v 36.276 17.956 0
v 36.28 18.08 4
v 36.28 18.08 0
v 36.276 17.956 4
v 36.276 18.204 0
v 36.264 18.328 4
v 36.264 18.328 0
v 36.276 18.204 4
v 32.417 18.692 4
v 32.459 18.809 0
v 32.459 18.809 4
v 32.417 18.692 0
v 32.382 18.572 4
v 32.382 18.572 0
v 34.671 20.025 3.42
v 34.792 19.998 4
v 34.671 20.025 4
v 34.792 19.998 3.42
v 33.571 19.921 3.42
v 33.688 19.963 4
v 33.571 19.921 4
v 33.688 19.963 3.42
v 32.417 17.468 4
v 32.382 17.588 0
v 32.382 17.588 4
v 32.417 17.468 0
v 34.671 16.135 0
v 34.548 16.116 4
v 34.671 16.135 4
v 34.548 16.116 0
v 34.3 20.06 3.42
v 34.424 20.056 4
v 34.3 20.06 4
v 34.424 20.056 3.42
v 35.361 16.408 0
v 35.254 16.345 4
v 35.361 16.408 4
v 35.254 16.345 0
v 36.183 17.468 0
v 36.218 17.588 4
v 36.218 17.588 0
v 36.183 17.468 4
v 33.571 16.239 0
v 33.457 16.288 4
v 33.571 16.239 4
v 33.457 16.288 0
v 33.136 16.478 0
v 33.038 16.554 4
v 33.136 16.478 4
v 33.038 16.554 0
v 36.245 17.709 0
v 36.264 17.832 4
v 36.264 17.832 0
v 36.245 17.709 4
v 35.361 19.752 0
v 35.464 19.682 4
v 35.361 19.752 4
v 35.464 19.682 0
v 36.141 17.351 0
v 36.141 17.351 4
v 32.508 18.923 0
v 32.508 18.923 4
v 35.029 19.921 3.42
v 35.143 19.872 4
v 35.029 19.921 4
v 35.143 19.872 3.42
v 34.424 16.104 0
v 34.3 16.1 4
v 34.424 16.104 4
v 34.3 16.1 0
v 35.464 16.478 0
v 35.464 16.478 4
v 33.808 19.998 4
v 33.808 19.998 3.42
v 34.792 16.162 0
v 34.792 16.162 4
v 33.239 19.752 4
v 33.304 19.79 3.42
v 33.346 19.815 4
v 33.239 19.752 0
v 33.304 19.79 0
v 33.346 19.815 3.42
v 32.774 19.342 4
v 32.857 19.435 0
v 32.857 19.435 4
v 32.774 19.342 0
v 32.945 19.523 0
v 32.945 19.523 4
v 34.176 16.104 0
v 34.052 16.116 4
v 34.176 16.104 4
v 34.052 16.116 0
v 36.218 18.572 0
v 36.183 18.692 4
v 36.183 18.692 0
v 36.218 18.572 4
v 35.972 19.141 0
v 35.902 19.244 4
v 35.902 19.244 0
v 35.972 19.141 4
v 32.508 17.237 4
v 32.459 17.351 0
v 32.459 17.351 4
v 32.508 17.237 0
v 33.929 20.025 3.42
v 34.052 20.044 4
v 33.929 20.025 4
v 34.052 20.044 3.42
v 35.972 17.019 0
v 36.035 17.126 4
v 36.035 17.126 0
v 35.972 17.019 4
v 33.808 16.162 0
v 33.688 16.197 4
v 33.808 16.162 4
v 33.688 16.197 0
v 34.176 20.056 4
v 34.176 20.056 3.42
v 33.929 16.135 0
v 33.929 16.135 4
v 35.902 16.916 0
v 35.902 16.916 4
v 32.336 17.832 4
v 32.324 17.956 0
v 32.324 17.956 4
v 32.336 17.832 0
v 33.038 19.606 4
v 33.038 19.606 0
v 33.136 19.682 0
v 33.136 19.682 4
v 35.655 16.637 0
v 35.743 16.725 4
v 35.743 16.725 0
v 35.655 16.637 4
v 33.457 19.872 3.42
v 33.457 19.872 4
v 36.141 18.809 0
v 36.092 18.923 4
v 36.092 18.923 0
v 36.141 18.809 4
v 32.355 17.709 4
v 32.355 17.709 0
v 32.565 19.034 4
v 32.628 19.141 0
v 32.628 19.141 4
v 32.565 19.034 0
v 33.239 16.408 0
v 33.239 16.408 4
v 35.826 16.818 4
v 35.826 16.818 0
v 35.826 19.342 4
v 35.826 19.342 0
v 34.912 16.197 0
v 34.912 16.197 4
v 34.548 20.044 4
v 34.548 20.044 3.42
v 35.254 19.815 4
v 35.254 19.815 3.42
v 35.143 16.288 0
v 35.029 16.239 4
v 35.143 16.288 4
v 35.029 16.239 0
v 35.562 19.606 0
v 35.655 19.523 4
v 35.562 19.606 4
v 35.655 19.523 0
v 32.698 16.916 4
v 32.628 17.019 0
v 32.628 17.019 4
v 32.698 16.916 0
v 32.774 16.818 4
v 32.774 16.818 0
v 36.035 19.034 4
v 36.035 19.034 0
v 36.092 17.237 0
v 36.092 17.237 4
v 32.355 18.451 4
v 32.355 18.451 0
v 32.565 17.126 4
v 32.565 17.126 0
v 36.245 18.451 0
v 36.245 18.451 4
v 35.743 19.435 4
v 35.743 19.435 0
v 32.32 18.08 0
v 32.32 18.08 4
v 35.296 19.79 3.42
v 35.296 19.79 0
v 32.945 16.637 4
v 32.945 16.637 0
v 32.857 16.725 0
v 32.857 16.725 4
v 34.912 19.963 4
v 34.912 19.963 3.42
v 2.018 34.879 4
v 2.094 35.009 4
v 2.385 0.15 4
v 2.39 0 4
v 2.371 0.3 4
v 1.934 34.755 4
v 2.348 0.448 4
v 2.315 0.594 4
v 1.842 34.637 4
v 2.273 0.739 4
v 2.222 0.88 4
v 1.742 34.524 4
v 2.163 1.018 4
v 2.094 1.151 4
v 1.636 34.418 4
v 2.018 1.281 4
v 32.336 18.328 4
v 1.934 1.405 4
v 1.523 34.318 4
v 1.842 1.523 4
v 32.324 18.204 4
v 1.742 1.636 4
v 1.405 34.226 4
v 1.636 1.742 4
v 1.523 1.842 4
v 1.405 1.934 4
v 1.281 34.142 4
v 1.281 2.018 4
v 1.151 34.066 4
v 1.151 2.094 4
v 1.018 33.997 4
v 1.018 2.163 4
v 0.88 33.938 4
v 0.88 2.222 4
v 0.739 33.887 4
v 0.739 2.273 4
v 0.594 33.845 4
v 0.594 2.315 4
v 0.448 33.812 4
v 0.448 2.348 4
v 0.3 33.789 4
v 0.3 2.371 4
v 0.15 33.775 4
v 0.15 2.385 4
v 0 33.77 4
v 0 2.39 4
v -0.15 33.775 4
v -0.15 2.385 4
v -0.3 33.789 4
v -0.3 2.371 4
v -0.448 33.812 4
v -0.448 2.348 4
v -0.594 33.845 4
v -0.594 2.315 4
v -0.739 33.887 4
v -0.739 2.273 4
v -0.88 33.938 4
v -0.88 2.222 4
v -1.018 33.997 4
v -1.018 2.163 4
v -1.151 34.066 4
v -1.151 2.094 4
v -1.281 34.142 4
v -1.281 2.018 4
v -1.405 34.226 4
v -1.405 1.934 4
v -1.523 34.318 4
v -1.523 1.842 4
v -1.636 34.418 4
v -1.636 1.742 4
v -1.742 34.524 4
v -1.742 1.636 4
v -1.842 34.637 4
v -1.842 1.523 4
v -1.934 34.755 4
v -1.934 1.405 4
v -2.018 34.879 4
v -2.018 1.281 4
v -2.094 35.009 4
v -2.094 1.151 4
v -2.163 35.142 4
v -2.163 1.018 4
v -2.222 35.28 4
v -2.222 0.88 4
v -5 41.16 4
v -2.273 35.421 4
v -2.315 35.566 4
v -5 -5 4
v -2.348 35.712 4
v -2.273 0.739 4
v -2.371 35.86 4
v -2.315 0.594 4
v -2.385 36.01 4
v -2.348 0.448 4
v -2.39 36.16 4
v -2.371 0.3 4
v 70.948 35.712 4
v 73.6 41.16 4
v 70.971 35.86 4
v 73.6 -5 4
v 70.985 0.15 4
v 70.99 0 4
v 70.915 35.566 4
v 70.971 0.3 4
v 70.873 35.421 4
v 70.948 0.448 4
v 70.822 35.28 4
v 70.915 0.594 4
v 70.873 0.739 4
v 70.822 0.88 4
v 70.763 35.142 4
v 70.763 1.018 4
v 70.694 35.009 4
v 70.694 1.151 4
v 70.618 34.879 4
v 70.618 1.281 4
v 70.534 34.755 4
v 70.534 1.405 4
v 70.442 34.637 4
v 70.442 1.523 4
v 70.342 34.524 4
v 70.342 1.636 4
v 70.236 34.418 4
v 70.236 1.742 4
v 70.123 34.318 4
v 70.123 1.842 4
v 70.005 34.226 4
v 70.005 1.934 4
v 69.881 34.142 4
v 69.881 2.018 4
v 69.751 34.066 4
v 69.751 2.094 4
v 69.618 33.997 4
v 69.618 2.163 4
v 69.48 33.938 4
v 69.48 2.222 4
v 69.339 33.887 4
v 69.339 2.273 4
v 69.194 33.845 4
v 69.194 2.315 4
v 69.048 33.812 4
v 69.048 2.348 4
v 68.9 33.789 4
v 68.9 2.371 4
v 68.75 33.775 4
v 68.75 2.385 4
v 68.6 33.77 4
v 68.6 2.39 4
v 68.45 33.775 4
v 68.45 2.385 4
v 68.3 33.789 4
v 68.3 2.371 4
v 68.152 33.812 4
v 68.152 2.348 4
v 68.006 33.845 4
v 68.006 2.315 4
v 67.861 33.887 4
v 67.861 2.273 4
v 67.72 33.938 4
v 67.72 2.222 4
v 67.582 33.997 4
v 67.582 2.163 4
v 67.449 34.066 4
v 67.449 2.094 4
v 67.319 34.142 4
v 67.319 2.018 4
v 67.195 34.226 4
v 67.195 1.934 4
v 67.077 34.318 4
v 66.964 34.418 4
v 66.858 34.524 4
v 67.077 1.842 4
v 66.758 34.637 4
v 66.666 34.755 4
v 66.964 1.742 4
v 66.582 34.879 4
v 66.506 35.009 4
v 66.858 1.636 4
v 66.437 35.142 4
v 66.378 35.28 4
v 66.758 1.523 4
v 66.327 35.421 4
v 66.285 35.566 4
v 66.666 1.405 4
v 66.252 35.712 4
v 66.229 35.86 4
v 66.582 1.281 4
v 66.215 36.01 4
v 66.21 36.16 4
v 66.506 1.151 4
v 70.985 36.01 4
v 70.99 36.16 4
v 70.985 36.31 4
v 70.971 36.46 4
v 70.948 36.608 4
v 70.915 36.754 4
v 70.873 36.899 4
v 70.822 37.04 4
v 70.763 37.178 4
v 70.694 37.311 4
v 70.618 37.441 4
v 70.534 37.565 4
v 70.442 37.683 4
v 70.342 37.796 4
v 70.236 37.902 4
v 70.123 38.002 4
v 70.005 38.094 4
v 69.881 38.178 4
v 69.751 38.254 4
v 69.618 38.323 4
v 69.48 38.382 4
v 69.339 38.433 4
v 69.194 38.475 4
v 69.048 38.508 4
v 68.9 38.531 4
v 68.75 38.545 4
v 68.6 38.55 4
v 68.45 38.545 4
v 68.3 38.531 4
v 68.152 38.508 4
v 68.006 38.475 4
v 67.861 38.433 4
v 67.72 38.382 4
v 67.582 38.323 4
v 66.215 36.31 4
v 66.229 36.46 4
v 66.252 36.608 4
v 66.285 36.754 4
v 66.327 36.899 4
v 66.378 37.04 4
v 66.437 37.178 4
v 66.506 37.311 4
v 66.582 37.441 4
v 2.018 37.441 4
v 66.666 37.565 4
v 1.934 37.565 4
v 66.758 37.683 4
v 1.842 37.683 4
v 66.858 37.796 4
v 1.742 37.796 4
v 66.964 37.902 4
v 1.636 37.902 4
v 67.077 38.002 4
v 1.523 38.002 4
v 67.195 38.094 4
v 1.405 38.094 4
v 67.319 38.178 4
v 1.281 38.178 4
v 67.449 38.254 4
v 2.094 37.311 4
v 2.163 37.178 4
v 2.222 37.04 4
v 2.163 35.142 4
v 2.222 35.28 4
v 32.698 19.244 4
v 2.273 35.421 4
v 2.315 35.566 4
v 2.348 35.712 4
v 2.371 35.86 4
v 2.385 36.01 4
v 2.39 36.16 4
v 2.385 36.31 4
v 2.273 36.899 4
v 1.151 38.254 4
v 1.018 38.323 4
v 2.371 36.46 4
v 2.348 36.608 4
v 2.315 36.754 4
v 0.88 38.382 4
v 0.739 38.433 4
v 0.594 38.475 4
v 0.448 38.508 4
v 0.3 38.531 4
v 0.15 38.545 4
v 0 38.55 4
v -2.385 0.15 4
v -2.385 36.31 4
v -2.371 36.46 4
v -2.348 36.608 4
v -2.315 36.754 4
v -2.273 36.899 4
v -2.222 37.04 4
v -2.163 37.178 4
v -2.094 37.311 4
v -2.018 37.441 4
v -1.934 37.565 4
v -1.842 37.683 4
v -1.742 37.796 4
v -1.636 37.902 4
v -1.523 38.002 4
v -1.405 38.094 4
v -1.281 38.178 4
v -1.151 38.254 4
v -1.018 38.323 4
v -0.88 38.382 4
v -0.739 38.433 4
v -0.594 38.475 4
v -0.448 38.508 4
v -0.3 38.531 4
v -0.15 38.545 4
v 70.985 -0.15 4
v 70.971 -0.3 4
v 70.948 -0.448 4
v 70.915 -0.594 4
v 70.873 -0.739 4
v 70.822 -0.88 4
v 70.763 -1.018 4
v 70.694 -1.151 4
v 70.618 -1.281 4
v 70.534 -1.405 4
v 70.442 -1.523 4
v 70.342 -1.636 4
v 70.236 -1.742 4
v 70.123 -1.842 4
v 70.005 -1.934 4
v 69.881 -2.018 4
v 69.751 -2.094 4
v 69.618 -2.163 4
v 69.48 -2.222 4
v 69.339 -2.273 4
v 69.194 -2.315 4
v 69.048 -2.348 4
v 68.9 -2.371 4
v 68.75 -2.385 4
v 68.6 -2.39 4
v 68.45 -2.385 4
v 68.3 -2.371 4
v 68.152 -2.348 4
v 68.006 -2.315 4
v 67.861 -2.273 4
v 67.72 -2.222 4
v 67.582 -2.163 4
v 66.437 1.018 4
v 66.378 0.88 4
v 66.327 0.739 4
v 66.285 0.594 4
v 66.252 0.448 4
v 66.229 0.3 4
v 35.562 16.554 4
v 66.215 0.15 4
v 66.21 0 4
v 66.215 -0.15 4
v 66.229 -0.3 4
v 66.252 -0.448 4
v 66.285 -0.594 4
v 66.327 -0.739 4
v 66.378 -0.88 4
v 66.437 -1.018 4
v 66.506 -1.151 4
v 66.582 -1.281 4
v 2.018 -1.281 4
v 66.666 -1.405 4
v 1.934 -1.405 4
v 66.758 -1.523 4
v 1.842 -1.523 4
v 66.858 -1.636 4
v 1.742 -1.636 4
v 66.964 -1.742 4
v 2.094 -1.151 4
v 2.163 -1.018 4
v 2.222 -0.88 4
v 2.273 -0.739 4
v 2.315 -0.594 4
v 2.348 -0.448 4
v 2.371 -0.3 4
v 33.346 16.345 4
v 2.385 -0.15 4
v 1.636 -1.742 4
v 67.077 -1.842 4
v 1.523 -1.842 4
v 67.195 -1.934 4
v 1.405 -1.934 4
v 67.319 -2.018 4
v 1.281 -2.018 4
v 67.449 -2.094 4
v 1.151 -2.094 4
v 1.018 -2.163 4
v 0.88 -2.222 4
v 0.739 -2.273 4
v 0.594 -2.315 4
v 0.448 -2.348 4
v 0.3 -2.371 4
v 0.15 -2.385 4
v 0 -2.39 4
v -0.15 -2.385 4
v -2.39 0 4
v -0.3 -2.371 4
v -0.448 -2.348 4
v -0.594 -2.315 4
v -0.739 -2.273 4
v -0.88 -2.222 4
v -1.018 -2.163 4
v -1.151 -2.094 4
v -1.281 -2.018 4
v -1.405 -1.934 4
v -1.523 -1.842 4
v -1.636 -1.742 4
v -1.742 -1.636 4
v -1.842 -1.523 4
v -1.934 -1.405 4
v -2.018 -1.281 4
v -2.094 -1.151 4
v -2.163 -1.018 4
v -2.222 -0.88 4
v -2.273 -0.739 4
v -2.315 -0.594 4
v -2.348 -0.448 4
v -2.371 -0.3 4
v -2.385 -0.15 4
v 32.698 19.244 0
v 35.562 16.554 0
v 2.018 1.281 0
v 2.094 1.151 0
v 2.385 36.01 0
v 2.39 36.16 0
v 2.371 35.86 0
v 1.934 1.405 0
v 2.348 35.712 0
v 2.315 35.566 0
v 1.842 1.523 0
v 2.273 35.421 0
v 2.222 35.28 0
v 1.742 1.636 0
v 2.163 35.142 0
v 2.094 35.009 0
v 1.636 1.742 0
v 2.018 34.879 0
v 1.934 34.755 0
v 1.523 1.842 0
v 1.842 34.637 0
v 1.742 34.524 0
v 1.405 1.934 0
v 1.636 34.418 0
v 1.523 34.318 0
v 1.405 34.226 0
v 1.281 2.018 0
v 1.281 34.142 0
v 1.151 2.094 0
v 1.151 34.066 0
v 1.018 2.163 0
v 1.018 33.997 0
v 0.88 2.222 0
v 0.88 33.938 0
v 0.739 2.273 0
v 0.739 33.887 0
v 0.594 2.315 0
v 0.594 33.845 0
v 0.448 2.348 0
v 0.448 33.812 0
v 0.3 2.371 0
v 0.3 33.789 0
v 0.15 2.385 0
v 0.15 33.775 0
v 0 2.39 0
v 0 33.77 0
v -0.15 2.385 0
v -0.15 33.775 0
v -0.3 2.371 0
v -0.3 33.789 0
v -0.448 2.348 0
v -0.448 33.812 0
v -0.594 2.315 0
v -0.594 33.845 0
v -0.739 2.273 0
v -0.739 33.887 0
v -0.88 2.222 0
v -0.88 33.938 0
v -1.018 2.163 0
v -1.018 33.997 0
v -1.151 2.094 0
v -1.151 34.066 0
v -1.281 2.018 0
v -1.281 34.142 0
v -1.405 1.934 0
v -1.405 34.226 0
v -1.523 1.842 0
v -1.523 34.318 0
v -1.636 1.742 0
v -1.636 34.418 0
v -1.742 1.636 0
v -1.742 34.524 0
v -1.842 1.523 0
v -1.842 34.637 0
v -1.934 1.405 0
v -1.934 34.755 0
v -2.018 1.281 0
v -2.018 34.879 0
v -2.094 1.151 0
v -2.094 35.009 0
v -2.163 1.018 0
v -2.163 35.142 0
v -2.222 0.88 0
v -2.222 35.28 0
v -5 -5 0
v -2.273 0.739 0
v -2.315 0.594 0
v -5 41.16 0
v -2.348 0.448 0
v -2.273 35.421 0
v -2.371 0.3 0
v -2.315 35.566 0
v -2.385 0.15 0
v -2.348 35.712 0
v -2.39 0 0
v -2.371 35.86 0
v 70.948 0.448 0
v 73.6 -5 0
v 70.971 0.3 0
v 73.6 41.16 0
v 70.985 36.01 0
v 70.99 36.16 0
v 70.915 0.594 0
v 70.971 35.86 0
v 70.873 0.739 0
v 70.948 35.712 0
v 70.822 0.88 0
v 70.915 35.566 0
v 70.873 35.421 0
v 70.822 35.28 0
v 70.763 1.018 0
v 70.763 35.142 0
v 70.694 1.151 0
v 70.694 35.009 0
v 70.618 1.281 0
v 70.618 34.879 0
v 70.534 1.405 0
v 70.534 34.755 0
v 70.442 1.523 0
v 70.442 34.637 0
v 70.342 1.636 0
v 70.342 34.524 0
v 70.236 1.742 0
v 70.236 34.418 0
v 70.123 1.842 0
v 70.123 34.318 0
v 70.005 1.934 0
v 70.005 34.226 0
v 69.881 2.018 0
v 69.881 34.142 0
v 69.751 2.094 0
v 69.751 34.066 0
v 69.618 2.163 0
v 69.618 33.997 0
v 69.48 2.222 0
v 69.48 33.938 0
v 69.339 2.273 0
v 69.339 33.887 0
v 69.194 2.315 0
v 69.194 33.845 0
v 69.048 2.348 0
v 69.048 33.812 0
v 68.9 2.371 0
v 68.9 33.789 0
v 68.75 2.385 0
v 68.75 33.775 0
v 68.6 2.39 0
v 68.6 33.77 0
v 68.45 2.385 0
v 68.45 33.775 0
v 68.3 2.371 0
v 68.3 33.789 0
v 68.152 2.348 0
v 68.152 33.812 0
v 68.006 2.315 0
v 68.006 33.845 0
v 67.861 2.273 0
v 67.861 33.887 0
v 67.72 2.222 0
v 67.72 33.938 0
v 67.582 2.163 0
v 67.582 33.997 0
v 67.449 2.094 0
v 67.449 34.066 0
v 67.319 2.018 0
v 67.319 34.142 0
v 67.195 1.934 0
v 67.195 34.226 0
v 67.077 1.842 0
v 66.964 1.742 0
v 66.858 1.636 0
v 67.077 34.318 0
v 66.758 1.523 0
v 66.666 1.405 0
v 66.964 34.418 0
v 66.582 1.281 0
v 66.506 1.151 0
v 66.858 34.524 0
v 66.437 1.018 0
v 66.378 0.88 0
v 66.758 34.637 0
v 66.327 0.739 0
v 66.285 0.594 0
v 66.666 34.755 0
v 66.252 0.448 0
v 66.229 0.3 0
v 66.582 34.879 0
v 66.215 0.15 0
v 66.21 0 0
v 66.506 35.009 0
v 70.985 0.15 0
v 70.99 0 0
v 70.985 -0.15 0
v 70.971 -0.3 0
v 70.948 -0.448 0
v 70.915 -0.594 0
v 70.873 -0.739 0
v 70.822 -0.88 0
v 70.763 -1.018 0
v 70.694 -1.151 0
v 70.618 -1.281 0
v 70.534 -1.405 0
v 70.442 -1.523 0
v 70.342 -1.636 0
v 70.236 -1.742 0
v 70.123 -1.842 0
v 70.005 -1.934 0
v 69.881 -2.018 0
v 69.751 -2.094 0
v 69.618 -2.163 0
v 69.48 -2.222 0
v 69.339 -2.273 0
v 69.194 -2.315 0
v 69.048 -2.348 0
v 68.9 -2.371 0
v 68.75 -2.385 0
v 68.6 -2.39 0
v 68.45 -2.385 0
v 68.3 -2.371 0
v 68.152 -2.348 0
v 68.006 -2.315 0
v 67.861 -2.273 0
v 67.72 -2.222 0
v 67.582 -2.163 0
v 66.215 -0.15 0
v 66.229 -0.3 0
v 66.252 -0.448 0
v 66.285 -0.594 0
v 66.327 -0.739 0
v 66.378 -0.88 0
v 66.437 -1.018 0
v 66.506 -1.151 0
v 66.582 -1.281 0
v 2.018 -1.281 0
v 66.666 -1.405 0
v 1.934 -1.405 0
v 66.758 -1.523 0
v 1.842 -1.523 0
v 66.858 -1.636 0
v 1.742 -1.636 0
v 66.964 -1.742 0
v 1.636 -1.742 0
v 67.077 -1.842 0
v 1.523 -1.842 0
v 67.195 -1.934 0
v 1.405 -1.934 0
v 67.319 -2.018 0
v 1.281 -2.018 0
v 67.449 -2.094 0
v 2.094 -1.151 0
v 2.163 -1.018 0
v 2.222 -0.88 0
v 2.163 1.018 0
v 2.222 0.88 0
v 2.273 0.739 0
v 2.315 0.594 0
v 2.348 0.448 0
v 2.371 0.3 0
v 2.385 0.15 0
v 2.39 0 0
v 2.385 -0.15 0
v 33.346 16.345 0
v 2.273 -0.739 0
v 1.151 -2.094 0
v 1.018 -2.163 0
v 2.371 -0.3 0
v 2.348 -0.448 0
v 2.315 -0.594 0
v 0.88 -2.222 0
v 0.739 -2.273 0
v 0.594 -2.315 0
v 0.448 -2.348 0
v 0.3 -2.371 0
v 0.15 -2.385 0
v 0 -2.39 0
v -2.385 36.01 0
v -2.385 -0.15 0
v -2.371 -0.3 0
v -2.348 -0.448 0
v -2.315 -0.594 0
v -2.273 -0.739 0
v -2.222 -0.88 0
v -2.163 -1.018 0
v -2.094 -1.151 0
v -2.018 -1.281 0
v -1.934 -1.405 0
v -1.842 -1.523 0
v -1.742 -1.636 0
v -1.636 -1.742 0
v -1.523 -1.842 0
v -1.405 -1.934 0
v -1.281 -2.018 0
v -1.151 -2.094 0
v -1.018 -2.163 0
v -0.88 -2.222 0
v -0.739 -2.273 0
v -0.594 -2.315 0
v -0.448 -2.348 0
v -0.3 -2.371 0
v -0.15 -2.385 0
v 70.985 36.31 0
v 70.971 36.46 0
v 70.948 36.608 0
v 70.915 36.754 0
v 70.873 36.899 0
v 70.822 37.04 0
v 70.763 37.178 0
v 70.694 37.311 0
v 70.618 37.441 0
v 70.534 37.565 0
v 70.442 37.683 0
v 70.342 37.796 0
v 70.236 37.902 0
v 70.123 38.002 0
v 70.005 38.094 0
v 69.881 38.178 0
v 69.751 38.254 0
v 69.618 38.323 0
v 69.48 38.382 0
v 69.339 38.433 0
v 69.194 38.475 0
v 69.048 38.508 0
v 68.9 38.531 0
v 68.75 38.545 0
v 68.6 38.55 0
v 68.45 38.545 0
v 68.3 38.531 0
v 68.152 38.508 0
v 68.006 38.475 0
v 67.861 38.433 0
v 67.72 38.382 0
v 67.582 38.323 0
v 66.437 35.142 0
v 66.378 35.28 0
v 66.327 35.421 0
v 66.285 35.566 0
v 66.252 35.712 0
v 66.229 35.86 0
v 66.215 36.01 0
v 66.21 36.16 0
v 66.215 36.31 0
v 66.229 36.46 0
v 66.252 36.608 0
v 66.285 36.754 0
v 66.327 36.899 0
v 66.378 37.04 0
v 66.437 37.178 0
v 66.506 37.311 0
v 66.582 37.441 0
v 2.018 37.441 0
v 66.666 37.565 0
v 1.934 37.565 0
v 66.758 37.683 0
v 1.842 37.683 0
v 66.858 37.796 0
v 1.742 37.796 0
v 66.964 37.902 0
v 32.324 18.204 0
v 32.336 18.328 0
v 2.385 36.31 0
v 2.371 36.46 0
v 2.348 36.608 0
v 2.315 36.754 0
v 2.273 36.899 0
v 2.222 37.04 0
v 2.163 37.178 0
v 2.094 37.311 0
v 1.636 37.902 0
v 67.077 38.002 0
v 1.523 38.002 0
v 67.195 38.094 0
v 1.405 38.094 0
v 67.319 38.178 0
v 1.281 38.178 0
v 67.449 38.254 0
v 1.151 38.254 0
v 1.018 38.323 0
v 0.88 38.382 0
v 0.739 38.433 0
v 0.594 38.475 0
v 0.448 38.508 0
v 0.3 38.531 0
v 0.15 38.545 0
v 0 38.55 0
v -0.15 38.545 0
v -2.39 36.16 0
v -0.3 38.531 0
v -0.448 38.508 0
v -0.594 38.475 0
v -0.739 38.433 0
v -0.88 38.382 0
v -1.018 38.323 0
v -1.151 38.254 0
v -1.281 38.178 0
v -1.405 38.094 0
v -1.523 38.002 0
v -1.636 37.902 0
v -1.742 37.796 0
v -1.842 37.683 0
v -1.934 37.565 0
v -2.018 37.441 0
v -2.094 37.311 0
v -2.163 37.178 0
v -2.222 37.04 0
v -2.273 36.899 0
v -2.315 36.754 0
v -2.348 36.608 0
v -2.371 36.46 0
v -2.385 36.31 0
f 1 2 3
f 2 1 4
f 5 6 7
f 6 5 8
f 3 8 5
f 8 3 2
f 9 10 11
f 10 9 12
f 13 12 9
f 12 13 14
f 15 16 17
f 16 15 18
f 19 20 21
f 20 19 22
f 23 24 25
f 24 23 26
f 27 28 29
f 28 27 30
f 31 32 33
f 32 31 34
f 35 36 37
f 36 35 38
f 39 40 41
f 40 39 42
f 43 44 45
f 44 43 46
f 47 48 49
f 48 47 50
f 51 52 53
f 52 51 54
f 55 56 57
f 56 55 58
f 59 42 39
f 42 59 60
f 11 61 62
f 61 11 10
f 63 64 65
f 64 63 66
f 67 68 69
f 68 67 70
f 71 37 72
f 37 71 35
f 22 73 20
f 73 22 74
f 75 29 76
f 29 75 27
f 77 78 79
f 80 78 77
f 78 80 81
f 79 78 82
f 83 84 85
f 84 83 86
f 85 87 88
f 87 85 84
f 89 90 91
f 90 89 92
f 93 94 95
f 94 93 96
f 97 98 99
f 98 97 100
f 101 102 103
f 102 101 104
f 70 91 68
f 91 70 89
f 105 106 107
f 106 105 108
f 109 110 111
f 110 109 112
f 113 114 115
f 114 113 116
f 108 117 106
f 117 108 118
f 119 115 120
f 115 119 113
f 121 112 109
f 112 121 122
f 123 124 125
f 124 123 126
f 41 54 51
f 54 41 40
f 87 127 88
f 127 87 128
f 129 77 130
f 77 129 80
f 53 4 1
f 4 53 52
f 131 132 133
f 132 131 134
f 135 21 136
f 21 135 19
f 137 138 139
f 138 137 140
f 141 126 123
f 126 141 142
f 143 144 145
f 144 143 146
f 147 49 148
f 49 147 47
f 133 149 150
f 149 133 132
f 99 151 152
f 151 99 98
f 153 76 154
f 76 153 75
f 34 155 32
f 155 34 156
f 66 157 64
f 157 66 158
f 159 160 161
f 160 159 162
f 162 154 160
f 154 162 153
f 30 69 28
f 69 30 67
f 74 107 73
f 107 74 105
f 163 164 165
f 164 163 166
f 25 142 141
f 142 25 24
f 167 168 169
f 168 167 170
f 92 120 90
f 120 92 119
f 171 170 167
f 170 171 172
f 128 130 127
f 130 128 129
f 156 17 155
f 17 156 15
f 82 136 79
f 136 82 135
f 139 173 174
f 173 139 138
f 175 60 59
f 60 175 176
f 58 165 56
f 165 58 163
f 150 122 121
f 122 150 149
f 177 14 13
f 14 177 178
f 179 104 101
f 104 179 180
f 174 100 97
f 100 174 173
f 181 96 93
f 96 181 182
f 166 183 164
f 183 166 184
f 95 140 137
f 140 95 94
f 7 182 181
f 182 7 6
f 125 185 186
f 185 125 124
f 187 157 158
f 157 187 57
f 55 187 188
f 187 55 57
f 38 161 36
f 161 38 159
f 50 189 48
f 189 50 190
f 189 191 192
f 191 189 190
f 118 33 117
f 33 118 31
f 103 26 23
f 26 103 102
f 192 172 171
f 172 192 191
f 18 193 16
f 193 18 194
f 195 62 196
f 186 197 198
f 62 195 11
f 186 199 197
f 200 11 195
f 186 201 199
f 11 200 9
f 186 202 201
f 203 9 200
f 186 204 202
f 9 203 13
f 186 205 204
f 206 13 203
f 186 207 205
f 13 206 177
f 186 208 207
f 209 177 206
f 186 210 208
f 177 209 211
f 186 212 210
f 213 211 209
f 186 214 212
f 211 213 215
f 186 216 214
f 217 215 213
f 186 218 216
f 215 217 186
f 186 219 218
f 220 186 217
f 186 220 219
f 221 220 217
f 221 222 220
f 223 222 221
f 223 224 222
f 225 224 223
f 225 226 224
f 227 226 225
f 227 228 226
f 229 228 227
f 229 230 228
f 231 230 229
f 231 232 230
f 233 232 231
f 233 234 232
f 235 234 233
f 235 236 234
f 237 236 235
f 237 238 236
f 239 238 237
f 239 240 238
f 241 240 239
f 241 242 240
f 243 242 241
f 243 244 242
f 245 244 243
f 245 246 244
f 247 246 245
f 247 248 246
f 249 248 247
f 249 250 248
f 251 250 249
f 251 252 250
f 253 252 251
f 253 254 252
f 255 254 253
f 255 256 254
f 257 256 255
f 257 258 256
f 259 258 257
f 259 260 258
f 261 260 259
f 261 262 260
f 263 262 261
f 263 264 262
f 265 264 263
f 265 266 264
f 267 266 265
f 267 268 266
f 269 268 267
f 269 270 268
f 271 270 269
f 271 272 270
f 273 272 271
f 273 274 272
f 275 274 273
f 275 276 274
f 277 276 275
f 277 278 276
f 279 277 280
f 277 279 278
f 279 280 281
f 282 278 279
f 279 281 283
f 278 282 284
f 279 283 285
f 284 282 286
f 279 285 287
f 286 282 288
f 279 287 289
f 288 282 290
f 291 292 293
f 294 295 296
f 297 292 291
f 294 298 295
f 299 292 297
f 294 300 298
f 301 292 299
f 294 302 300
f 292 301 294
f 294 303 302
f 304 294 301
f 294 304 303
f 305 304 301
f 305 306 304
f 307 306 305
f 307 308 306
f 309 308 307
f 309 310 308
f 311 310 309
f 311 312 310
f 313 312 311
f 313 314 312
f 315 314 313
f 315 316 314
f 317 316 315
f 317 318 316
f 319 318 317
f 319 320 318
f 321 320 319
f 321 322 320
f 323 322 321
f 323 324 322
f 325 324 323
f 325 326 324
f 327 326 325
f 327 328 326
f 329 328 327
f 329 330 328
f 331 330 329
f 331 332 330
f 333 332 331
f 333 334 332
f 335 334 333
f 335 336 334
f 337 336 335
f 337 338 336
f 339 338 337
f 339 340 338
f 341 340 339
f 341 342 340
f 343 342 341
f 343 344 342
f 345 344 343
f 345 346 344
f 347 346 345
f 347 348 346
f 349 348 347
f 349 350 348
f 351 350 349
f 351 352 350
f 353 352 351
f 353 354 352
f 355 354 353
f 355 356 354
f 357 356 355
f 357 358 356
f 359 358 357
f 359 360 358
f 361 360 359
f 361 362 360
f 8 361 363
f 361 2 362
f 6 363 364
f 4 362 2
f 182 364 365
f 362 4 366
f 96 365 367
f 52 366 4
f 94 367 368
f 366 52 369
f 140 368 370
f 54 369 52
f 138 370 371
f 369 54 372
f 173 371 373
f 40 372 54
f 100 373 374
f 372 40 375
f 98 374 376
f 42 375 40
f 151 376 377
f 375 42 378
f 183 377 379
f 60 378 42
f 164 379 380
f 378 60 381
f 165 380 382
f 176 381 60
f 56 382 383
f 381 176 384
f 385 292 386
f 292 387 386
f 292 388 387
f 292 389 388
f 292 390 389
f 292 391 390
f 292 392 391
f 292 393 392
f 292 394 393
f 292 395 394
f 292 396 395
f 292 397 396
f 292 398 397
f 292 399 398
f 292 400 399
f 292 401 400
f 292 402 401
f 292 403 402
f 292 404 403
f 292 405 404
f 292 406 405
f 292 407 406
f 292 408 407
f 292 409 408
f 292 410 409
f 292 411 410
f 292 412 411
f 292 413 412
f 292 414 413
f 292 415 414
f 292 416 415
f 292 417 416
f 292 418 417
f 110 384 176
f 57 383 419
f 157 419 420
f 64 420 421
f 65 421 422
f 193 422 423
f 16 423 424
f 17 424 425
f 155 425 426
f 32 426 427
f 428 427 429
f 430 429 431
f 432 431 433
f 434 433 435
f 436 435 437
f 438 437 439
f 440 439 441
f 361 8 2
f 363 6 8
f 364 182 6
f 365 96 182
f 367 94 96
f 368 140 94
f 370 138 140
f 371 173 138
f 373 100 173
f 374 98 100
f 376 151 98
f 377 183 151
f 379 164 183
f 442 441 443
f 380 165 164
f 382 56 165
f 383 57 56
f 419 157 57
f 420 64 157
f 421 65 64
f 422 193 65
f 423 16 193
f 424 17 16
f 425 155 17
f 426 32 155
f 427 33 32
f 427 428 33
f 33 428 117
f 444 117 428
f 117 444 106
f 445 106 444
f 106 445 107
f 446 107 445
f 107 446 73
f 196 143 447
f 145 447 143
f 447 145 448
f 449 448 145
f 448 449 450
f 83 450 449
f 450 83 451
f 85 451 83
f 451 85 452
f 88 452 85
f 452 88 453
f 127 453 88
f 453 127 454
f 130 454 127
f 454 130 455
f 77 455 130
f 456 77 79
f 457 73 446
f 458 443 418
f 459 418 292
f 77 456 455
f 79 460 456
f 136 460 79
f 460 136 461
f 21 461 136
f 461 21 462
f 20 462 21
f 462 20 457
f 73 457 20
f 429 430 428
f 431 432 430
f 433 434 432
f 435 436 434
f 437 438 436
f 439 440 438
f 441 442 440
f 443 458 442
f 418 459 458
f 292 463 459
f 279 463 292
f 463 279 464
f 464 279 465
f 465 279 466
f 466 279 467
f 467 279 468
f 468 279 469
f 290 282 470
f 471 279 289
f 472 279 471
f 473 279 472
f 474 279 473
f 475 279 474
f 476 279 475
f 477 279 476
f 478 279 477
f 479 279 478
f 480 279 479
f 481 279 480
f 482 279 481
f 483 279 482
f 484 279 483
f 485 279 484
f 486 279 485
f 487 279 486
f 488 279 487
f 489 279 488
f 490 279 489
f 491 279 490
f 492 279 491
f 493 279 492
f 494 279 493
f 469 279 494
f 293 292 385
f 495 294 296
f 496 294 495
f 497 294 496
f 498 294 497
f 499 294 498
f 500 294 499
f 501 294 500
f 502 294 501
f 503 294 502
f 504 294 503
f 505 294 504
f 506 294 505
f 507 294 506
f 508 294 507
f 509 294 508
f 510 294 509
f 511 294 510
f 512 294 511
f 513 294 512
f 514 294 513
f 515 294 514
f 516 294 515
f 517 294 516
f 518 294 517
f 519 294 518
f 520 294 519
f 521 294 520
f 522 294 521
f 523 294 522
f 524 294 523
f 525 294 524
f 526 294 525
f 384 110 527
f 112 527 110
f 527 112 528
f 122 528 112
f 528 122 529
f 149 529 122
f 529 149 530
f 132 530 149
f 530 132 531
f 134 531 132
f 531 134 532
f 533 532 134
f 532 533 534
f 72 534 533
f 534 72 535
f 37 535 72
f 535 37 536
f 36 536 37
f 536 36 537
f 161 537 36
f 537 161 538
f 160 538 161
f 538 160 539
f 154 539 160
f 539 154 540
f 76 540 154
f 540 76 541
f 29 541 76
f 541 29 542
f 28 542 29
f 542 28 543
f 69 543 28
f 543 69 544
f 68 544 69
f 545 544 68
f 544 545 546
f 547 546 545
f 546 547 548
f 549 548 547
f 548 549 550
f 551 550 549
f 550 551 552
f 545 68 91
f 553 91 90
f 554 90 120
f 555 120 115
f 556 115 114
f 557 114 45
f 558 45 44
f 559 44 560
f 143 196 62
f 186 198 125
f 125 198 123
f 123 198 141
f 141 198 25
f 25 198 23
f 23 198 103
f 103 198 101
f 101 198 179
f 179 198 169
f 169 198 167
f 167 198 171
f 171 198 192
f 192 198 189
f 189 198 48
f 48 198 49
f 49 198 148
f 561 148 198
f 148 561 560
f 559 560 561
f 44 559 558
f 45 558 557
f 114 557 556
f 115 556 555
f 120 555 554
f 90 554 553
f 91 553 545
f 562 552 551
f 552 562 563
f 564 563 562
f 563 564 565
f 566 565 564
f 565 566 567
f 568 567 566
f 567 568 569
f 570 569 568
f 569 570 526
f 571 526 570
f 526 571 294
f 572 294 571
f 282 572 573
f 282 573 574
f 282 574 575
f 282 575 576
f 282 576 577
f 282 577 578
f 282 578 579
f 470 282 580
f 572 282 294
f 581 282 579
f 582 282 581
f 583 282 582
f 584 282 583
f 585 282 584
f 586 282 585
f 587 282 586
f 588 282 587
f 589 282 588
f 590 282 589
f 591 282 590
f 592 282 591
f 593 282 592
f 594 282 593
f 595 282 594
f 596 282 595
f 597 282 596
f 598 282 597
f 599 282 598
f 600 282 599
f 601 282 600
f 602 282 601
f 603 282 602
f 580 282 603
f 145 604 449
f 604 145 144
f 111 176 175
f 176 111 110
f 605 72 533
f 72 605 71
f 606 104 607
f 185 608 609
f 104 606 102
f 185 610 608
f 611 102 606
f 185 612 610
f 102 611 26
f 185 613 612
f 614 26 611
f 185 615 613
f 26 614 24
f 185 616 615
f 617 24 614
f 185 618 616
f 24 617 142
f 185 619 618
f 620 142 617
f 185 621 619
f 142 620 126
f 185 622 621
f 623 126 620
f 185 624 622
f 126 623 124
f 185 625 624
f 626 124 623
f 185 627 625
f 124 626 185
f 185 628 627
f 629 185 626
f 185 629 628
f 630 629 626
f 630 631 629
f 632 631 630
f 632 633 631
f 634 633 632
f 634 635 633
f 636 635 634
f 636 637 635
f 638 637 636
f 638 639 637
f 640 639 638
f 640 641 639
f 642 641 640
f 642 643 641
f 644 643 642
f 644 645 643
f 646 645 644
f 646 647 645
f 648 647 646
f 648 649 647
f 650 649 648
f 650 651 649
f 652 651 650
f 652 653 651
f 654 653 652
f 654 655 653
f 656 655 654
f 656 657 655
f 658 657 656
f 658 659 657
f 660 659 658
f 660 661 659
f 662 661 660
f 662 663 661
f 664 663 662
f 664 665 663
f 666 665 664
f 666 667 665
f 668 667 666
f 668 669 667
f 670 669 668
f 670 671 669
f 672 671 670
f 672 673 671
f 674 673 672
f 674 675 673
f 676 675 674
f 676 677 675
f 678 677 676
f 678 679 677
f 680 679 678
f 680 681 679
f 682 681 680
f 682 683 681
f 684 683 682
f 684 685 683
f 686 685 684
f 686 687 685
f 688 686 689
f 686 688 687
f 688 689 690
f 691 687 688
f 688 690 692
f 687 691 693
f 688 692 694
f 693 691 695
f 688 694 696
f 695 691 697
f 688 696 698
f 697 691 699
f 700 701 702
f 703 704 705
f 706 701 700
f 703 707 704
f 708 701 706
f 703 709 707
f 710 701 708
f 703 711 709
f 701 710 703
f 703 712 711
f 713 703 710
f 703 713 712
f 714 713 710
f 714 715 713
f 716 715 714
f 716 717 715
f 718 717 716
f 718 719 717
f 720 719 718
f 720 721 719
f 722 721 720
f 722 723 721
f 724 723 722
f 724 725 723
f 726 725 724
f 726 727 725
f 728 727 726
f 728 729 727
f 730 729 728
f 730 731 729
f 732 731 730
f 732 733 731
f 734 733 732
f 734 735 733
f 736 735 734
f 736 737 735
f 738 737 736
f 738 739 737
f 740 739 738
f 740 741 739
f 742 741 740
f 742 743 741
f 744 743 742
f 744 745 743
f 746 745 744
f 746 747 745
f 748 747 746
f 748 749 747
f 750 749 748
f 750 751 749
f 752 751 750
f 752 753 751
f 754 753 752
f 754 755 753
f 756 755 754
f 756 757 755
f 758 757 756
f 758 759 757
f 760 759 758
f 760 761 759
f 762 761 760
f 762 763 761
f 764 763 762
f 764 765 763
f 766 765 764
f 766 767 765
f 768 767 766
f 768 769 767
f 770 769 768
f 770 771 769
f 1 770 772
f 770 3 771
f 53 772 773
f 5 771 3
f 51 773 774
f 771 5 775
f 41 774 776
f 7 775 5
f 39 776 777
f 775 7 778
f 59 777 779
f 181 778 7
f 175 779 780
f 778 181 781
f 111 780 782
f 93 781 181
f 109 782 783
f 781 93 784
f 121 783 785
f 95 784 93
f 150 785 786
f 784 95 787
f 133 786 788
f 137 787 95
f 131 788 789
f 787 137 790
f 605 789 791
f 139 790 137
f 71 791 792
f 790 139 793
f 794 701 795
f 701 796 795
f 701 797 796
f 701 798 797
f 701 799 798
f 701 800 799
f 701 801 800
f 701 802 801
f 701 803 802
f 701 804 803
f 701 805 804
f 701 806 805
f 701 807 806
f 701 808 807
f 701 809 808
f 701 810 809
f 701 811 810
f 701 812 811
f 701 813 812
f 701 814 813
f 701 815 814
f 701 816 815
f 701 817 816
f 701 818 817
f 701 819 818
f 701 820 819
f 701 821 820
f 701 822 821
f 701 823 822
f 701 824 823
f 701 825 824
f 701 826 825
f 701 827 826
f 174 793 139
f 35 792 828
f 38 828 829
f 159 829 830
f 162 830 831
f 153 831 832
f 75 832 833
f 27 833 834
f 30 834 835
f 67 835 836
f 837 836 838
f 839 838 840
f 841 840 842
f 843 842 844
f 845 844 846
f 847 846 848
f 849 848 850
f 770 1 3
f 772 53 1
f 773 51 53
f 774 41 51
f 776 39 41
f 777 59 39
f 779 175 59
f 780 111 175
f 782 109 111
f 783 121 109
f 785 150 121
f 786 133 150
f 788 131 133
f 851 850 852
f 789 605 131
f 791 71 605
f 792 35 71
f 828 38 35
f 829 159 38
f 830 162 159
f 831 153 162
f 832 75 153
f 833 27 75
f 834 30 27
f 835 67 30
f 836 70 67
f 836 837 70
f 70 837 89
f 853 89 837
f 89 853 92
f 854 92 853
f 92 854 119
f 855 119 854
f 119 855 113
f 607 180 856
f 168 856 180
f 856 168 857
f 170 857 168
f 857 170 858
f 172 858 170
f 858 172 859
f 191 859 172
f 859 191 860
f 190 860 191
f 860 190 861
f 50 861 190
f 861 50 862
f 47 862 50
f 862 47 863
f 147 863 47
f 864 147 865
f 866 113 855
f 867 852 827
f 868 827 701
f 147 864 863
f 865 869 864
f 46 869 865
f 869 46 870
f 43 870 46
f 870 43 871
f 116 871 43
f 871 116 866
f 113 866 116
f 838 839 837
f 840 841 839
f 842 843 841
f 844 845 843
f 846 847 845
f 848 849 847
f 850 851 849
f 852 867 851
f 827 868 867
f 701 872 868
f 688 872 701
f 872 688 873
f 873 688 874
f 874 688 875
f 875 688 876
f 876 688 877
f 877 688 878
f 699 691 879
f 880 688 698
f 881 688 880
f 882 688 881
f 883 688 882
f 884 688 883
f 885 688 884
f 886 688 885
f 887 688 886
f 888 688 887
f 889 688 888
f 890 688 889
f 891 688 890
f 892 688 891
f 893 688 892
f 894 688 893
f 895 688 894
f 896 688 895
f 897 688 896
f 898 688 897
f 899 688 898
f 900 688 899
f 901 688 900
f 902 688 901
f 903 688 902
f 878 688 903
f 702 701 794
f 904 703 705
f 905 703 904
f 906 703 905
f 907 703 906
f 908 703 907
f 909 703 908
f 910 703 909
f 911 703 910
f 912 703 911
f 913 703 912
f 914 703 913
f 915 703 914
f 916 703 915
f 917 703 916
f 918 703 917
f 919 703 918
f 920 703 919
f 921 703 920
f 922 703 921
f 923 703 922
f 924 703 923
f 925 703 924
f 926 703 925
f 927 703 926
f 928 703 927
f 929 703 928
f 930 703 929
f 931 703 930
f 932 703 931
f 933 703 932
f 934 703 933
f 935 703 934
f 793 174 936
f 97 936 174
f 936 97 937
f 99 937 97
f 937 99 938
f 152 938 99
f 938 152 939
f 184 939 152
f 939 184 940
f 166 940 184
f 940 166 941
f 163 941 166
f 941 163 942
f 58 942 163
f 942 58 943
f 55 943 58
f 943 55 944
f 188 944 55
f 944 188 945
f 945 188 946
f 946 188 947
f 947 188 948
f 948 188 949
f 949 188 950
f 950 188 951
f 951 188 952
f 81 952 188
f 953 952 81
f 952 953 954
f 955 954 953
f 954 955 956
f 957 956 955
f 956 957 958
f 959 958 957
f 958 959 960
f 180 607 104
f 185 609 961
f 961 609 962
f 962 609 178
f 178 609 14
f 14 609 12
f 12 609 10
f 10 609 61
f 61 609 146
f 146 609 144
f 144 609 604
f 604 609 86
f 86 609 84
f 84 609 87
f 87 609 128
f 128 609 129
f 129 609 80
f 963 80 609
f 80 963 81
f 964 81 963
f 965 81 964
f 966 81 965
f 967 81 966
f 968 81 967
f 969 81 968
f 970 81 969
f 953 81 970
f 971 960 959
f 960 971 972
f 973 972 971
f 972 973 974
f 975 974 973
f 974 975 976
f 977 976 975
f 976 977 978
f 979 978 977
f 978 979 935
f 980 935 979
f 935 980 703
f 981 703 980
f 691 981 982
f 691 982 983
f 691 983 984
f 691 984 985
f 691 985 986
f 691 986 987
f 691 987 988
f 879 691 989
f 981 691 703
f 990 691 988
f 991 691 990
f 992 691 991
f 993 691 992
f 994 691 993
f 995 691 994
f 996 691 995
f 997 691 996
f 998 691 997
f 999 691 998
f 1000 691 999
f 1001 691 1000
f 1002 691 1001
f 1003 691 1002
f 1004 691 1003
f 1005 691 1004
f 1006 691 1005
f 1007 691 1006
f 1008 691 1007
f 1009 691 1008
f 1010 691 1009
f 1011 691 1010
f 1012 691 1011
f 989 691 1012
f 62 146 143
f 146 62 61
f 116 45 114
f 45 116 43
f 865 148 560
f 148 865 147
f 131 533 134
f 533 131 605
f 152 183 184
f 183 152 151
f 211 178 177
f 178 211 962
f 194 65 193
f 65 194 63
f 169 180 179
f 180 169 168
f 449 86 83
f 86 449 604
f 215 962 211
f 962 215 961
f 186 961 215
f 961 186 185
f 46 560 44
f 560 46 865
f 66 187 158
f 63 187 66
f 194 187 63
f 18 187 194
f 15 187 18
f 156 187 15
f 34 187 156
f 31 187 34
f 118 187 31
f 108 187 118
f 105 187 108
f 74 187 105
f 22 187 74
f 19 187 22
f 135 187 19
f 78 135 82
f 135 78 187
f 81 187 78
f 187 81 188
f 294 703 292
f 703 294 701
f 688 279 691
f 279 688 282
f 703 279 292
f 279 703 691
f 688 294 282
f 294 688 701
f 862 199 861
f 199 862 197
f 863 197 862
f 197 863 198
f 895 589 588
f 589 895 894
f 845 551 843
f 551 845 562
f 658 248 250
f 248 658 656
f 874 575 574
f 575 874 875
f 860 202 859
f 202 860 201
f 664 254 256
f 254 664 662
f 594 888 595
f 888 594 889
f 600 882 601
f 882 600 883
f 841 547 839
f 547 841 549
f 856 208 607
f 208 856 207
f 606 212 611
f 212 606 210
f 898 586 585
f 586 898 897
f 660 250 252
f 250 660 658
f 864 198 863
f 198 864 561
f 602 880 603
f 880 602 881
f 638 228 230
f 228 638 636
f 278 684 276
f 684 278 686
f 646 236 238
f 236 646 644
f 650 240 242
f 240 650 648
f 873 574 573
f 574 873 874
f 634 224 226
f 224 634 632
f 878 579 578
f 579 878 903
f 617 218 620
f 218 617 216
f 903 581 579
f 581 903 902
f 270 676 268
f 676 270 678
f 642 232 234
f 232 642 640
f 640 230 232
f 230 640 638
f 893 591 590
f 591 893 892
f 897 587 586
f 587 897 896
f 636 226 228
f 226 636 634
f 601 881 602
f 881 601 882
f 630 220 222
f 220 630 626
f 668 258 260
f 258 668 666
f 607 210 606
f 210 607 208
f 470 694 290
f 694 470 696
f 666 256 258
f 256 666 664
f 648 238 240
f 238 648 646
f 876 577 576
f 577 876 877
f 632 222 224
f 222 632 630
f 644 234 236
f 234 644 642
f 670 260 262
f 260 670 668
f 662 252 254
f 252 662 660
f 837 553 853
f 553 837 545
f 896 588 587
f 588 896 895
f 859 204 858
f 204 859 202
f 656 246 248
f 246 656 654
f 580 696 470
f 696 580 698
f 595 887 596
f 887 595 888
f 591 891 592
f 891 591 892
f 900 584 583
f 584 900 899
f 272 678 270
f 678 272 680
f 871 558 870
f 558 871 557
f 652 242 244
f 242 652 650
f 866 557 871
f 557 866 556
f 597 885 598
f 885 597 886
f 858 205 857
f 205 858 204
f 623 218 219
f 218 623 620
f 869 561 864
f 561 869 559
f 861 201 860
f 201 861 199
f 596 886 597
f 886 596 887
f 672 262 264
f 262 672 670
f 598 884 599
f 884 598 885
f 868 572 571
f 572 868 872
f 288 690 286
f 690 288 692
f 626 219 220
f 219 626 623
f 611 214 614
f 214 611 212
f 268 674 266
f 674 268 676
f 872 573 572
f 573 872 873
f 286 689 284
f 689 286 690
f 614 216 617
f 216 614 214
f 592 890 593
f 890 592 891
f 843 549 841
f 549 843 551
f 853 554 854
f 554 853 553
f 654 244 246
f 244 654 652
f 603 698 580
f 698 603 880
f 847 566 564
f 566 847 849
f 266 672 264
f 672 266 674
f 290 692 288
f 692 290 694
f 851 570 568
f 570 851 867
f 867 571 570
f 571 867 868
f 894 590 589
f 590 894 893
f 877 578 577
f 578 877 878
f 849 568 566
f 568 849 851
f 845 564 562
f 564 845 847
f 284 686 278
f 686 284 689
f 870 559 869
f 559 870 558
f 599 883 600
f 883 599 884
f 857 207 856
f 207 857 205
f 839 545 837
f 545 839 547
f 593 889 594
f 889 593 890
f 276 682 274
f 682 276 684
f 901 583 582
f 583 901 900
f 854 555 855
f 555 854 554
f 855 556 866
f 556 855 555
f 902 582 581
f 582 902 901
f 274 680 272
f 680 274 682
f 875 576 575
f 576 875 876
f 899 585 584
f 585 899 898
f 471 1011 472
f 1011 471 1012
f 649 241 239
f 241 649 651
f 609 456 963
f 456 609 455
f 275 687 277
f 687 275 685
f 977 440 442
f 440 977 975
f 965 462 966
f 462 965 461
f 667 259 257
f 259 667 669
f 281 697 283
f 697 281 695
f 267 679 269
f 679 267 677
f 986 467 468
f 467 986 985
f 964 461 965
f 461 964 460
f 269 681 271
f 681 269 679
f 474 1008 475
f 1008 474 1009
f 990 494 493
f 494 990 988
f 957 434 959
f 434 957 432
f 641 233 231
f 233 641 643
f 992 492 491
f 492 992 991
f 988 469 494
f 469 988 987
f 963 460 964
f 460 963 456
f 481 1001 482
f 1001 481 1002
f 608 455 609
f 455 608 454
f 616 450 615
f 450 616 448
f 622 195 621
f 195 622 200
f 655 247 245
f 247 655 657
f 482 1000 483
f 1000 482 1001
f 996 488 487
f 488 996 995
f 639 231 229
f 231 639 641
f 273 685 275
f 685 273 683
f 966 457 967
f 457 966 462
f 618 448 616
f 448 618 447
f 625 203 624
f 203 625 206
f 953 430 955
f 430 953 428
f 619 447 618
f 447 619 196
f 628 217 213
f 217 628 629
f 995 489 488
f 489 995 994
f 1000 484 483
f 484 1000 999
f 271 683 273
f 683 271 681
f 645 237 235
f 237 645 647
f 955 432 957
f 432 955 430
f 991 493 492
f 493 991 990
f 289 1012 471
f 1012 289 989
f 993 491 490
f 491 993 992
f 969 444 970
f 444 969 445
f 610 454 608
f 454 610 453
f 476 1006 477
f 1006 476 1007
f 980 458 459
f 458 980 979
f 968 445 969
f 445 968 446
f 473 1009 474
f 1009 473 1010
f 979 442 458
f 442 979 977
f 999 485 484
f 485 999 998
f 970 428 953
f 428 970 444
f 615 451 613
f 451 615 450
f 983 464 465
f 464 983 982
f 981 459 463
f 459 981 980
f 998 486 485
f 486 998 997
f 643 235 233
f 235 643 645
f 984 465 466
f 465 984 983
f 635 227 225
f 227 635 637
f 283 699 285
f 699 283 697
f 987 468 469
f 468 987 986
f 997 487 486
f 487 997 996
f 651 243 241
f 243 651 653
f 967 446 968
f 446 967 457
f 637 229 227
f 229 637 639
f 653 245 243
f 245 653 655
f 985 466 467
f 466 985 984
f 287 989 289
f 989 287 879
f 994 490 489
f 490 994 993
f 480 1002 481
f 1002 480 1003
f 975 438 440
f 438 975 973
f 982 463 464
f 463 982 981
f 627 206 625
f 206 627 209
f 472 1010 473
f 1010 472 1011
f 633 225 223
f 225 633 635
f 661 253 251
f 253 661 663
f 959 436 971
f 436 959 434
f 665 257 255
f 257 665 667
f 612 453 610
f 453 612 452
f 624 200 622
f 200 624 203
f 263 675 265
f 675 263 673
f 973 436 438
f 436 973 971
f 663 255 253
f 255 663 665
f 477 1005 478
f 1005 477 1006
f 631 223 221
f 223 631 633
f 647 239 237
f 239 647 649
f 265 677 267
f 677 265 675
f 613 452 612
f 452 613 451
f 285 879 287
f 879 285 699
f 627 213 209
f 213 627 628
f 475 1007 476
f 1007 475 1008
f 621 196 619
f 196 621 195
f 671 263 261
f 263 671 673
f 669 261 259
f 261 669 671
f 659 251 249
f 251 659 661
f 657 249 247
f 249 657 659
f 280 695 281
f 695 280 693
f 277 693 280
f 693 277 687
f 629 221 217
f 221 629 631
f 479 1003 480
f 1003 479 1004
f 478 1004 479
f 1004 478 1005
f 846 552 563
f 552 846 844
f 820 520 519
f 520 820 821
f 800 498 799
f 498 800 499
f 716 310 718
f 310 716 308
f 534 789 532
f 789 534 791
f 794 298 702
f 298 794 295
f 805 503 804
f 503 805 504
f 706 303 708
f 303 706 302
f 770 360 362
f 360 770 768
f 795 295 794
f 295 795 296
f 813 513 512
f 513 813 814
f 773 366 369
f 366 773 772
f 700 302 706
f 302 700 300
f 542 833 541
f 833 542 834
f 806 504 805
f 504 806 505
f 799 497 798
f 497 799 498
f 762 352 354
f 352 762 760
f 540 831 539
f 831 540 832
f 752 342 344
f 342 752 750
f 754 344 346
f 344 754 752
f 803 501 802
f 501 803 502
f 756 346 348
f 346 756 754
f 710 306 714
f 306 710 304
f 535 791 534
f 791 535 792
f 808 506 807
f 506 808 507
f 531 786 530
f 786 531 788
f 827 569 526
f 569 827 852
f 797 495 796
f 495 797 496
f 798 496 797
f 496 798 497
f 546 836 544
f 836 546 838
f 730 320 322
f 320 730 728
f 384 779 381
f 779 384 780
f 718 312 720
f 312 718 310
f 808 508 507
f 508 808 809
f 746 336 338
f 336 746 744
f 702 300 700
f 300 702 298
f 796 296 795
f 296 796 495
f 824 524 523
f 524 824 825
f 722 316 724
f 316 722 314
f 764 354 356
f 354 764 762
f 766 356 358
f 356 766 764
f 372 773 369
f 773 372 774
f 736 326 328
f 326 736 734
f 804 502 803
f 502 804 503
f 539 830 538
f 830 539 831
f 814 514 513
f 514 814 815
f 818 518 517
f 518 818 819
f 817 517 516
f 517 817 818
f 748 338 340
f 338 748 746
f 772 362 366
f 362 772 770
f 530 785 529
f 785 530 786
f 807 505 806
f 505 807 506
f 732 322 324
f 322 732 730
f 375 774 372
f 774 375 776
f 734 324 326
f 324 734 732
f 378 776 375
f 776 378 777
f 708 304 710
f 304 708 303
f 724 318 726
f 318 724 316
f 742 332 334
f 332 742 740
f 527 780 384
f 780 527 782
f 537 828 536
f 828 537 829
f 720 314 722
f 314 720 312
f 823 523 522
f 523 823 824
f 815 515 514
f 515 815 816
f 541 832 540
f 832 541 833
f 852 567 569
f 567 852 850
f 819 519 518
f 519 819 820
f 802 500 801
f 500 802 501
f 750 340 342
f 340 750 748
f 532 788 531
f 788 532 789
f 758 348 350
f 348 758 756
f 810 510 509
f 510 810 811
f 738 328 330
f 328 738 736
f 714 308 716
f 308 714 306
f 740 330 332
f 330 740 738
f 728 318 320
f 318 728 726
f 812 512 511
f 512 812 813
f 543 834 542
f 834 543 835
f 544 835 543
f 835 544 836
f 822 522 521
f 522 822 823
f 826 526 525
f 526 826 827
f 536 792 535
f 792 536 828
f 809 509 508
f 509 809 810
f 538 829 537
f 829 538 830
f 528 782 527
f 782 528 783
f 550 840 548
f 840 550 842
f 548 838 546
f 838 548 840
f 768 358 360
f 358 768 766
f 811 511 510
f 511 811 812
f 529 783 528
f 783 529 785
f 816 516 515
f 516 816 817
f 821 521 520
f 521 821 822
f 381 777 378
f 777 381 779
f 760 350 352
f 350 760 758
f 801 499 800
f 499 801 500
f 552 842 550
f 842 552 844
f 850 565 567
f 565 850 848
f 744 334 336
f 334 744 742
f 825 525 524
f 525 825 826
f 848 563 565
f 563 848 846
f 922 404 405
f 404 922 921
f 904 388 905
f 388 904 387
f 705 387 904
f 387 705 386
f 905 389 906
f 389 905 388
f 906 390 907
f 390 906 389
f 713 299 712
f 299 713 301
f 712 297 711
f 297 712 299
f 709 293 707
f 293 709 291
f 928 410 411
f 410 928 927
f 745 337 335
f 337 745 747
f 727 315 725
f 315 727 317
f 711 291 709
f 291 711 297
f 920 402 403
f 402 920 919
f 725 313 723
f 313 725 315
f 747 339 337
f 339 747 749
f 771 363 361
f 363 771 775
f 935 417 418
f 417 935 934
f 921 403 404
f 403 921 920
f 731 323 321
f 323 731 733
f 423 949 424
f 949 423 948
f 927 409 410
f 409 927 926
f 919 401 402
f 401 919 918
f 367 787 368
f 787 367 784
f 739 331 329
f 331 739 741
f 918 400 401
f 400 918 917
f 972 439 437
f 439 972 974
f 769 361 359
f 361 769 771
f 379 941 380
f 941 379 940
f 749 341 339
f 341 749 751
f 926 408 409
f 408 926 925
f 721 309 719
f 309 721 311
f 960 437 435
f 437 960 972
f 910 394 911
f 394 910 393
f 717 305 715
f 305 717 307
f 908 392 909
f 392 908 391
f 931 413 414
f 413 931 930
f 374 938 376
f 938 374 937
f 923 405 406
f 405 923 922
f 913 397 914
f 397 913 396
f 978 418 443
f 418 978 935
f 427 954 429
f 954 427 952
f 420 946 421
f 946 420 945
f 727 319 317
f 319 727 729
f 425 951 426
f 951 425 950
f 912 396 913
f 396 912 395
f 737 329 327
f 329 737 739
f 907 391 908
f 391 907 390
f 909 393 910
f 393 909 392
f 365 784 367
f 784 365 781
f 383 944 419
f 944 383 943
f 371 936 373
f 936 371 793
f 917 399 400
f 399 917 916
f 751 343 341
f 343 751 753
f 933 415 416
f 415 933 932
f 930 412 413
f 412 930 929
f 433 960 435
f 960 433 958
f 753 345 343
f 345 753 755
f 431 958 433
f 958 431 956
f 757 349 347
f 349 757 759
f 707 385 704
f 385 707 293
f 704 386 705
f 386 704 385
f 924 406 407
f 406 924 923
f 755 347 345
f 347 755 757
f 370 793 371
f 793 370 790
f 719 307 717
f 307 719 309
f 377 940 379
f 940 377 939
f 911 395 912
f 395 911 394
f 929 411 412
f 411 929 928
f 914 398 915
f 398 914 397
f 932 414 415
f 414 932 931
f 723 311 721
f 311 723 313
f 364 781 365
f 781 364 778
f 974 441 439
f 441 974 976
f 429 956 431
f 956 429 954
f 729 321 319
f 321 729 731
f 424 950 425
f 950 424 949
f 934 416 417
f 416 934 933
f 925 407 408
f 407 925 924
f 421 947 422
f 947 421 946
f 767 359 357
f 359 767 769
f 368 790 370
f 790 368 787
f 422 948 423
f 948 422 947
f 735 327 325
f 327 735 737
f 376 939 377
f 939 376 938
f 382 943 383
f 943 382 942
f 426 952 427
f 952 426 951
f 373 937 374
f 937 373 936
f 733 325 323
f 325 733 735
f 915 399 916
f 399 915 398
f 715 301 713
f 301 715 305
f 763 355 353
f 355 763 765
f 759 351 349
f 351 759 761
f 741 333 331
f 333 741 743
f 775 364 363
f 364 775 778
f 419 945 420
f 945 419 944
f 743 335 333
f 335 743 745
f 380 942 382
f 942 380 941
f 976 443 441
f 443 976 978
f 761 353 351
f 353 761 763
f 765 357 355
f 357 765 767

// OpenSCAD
$fn=100;


d = 4.78;
r1 = d/2;
r2 = 10;

t = 4;

c1 = 36.16;
c2 = 68.60;

motorshaft = 3.96;
flatside = 3.42;

offset = 10;

difference() {
translate(v = [-offset/2, -offset/2]) cube(size = [c2+offset, c1+offset, t]);

translate(v = [0, 0]) cylinder(r = r1, h = t);
translate(v = [0, c1]) cylinder(r = r1, h = t);
translate(v = [c2, 0]) cylinder(r = r1, h = t);
translate(v = [c2, c1]) cylinder(r = r1, h = t);

translate(v = [c2/2, c1/2]) difference() {
cylinder(r=motorshaft/2, h = t);
translate(v = [-flatside/2, flatside/2]) cube(flatside);
}
}
projection(cut = true);
